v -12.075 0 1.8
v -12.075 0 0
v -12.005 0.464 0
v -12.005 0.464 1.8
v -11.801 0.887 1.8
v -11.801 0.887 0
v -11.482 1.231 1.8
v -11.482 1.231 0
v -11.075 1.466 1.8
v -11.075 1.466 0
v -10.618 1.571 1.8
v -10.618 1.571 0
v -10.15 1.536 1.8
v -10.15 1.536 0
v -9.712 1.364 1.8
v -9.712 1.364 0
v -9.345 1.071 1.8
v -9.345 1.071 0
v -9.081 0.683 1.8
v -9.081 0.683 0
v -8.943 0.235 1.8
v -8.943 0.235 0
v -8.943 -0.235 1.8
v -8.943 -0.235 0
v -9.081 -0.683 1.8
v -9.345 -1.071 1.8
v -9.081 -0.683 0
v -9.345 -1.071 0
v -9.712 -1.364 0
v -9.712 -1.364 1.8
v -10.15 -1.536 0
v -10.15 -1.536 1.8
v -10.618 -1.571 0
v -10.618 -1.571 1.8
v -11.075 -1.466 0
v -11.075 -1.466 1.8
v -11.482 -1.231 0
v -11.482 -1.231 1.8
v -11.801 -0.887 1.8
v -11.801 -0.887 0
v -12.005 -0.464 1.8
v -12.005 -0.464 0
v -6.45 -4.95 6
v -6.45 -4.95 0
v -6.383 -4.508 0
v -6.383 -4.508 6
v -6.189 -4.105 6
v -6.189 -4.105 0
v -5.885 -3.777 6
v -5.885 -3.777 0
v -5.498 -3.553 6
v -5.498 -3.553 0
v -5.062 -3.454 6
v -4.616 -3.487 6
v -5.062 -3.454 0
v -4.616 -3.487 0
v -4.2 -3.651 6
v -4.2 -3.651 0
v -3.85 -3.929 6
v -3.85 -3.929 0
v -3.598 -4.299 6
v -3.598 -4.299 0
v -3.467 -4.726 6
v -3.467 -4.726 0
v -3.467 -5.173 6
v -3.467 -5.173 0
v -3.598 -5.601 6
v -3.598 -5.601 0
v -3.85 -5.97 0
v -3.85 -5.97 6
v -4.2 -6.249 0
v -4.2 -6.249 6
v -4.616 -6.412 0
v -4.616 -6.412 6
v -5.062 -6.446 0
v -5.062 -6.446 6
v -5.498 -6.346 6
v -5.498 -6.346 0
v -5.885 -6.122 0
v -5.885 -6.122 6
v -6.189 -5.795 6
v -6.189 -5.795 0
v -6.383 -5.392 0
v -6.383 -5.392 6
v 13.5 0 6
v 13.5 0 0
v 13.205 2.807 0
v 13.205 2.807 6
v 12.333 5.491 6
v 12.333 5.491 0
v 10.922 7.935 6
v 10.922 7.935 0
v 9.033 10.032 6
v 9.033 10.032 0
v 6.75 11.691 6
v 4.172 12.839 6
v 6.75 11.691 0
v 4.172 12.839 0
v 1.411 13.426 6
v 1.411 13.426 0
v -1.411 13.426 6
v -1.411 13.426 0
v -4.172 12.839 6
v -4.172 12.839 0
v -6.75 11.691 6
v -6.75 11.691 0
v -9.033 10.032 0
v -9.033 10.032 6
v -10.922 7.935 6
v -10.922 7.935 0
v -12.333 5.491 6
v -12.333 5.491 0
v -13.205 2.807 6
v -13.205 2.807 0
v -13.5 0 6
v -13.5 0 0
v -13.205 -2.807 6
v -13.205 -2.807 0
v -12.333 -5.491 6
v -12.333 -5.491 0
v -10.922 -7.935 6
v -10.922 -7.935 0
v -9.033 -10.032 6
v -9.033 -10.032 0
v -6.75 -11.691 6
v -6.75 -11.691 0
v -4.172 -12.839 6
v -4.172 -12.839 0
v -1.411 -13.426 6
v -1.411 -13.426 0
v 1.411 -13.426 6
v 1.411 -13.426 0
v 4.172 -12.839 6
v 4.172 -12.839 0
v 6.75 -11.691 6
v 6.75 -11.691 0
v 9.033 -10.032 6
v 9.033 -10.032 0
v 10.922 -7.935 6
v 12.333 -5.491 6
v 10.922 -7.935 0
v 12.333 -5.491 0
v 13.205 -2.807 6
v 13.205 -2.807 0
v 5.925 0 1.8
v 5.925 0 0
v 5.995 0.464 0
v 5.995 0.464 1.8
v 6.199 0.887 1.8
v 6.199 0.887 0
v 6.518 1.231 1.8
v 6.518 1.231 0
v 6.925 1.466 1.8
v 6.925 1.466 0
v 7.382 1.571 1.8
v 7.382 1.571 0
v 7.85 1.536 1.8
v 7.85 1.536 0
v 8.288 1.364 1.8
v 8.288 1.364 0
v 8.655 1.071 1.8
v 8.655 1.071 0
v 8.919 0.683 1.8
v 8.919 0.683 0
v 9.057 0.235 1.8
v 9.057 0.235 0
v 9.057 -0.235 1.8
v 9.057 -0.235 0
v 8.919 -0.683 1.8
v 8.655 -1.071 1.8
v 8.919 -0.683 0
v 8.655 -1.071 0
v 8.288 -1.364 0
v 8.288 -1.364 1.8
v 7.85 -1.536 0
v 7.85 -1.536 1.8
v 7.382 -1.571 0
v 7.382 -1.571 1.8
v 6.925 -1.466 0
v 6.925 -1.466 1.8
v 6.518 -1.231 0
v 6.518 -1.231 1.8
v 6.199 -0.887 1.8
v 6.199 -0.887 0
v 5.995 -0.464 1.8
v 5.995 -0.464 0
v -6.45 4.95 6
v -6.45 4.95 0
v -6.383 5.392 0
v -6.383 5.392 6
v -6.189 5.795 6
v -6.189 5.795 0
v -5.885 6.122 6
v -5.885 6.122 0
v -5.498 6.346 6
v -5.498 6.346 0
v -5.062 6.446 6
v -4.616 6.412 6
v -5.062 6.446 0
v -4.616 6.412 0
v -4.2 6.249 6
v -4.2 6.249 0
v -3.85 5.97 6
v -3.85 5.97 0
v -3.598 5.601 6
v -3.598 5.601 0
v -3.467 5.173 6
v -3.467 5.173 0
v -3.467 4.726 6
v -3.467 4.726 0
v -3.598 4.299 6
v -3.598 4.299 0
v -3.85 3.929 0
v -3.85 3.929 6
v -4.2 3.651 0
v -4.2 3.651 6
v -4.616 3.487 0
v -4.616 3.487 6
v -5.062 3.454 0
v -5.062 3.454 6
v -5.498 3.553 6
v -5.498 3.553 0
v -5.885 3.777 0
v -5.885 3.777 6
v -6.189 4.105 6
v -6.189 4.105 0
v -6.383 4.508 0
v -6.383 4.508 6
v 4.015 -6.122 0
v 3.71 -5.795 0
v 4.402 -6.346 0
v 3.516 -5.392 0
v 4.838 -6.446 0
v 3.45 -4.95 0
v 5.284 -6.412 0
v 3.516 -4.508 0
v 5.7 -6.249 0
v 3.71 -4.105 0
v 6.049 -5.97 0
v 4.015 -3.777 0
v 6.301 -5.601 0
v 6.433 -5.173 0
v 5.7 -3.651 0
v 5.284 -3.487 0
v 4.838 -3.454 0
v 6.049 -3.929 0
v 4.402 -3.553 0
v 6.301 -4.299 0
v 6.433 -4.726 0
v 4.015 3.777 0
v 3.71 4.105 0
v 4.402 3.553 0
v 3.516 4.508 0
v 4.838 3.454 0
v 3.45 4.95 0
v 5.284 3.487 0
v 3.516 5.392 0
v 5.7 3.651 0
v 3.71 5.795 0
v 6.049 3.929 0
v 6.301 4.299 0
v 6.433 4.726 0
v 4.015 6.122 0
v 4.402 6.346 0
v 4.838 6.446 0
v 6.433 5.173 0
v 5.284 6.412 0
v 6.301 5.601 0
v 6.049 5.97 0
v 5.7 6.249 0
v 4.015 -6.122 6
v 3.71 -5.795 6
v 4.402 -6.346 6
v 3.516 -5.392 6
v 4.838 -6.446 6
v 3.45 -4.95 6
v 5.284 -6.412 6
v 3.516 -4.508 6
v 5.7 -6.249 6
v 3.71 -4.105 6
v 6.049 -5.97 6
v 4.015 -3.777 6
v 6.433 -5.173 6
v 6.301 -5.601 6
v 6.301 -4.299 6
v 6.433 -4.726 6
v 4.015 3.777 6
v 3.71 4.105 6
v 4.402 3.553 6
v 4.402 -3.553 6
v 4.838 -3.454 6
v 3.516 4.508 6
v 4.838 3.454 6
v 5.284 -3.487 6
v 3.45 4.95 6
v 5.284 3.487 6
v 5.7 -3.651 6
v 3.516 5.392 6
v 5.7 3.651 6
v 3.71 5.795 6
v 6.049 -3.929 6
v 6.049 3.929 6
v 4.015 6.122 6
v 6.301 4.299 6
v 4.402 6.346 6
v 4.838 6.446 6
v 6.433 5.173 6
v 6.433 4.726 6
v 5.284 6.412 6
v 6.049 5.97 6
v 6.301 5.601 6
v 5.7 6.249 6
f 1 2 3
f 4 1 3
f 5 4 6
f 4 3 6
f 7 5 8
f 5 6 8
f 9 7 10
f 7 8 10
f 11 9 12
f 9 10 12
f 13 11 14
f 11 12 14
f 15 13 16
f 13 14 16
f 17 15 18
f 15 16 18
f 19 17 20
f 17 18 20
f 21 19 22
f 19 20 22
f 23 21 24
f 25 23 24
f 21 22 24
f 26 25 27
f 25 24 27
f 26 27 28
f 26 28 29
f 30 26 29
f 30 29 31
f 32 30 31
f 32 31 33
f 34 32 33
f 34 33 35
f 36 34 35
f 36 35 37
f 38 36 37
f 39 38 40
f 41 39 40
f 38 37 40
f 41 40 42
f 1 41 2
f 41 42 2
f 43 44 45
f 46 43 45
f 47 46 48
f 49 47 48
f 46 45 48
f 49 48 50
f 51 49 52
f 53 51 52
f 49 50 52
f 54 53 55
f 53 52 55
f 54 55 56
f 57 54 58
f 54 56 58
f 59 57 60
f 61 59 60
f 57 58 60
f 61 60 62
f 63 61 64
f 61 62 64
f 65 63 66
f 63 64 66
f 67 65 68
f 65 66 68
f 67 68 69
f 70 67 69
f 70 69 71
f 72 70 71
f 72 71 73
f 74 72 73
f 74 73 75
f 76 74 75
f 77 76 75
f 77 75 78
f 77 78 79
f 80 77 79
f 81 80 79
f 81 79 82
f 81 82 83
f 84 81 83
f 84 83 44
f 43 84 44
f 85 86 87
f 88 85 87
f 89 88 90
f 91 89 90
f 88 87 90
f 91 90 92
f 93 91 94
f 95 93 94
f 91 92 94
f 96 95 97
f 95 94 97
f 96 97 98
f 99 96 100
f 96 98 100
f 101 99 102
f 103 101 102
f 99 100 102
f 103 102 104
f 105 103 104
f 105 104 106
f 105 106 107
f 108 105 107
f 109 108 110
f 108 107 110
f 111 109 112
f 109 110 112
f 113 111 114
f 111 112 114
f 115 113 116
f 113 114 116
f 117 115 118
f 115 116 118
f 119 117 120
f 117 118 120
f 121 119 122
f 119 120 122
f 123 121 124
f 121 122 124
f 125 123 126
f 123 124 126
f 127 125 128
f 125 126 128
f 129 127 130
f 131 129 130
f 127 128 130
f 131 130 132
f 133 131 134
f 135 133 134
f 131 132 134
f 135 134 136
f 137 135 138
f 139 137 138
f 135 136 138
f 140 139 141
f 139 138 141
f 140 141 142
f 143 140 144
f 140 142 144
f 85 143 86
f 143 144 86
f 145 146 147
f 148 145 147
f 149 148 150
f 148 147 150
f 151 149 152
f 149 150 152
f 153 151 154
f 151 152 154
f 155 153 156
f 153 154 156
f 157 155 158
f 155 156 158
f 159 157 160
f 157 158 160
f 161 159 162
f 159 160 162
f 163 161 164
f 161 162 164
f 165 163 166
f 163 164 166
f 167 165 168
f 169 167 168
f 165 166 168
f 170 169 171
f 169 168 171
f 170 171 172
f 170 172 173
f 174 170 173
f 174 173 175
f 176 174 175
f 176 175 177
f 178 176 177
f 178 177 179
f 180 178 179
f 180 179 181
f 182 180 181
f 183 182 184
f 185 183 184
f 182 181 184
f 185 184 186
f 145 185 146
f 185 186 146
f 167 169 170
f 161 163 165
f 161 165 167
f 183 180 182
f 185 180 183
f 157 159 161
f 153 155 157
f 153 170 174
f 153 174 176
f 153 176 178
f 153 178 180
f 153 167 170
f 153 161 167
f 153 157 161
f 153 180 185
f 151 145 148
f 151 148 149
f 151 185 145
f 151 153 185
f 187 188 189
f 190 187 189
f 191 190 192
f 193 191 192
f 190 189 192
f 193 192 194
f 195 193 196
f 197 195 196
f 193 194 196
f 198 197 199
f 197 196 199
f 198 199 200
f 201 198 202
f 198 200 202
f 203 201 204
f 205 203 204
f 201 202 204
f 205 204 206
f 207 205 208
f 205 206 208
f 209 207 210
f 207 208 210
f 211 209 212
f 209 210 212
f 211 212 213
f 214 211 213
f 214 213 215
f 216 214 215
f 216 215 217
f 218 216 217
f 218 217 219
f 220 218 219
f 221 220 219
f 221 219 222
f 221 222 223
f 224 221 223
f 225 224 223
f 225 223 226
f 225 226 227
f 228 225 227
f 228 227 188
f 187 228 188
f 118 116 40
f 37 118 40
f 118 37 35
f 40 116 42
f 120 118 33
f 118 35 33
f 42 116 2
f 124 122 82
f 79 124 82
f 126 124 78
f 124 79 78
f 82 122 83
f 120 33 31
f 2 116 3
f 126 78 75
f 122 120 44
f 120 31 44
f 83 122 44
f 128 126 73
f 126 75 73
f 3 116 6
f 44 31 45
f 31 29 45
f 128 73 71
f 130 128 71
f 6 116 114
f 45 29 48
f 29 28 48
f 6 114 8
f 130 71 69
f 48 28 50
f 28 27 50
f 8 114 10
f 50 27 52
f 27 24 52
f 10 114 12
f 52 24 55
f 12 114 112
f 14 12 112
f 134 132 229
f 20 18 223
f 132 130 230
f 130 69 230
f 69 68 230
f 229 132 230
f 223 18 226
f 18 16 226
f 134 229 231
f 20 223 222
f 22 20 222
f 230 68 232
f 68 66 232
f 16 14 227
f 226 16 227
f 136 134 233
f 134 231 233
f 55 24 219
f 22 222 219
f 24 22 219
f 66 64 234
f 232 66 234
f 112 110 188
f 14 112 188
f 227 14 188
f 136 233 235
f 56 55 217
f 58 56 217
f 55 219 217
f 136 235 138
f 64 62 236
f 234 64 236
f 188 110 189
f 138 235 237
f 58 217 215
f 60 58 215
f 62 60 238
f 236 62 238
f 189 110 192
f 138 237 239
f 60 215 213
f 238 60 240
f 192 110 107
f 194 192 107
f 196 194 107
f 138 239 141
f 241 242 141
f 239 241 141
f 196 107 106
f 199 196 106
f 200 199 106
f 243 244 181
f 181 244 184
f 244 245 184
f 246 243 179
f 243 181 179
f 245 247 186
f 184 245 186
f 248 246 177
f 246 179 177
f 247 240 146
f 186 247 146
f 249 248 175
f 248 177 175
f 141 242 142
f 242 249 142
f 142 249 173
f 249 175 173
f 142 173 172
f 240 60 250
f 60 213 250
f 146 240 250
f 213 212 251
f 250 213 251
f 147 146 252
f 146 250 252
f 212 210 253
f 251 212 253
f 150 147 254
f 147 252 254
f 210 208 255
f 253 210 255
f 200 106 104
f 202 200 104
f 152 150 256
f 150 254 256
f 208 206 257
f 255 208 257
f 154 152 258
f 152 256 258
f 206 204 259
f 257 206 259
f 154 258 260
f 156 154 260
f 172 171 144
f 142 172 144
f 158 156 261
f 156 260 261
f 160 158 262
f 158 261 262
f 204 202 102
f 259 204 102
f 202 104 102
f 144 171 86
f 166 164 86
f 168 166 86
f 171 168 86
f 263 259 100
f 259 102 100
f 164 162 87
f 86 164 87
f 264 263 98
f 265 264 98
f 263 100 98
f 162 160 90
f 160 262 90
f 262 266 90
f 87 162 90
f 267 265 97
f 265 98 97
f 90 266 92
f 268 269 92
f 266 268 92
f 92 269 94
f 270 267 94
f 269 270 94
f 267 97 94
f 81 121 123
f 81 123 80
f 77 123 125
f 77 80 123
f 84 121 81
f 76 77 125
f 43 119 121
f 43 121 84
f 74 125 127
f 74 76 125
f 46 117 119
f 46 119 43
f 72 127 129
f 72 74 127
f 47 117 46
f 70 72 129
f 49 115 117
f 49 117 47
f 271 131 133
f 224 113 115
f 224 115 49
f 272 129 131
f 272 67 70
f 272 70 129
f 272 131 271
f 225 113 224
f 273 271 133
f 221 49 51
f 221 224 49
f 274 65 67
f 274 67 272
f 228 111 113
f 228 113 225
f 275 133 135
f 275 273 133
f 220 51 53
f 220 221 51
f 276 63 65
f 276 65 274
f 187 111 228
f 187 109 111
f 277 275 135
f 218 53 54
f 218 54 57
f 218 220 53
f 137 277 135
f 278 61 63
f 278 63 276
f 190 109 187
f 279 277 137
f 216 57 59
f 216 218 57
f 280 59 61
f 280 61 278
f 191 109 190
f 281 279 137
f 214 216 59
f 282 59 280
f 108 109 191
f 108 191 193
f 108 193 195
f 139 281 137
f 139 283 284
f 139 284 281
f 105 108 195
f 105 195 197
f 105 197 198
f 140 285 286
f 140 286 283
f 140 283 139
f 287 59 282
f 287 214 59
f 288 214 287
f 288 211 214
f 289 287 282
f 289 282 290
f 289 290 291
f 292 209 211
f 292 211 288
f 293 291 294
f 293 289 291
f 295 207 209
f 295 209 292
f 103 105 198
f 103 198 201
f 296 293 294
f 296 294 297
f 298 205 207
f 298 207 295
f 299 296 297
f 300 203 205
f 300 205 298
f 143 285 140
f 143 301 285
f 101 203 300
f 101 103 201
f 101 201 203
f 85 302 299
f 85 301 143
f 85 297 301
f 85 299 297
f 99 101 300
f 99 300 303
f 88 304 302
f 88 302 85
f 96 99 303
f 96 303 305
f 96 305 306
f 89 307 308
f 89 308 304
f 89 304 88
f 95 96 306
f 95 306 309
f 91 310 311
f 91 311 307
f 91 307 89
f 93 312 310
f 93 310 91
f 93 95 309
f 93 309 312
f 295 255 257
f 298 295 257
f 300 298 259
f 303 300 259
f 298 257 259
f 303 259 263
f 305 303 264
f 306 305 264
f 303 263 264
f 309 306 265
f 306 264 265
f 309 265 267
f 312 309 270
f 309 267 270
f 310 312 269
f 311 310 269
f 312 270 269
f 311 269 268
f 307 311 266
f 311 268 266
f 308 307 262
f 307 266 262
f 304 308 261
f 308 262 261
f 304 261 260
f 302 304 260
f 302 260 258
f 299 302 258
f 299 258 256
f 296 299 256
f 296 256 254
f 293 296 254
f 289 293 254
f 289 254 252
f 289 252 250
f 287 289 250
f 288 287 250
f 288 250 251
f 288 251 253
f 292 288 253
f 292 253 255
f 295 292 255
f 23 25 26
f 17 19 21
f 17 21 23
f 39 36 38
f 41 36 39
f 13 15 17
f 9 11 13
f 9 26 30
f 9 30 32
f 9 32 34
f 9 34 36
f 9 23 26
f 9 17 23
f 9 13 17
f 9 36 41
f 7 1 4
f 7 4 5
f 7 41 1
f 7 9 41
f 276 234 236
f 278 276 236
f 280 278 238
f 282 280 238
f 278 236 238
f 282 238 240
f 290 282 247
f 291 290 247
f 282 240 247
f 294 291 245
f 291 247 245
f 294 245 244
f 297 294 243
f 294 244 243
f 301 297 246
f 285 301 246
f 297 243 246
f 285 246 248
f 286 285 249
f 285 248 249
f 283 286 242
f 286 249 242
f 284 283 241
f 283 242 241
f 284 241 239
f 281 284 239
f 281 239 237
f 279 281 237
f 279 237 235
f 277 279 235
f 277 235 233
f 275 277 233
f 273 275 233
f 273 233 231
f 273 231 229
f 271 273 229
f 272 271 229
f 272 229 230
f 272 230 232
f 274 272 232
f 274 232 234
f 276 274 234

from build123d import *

# Parameters (mm, degrees)
CROQUIS1_R                        = 13.5
SALIENTE_EXTRUIR1_DEPTH           = 6
CROQUIS3_R                        = 1.575
CORTAR_EXTRUIR1_DEPTH             = 1.8
DI_METRO_DE_TALADRO_3_0_3_2_D     = 3
DI_METRO_DE_TALADRO_3_0_3_2_DEPTH = 50
DI_METRO_DE_TALADRO_3_0_3_2_TIP   = 0.901290929


with BuildPart() as part:
    # Croquis1 → Saliente-Extruir1 (new body)
    with BuildSketch(Plane.XY):
        Circle(CROQUIS1_R)
    extrude(amount=SALIENTE_EXTRUIR1_DEPTH)

    # Croquis3 → Cortar-Extruir1 (cut)
    with BuildSketch(Plane(origin=(0, 0, 0), x_dir=(-1, 0, 0), z_dir=(0, 0, -1))):
        with Locations((10.5, 0)):
            Circle(CROQUIS3_R)
        with Locations((-7.5, 0)):
            Circle(CROQUIS3_R)
    extrude(amount=-CORTAR_EXTRUIR1_DEPTH, mode=Mode.SUBTRACT)

    # Diámetro de taladro Ø3.0 (3)2
    with Locations(Plane.XY.offset(6)):
        with Locations((-4.949747468, 4.949747468), (-4.949747468, -4.949747468), (4.949747468, -4.949747468), (4.949747468, 4.949747468)):
            Hole(DI_METRO_DE_TALADRO_3_0_3_2_D / 2, depth=DI_METRO_DE_TALADRO_3_0_3_2_DEPTH)
            with Locations((0, 0, -(DI_METRO_DE_TALADRO_3_0_3_2_DEPTH + DI_METRO_DE_TALADRO_3_0_3_2_TIP / 2))):  # 118° drill point
                Cone(0, DI_METRO_DE_TALADRO_3_0_3_2_D / 2, DI_METRO_DE_TALADRO_3_0_3_2_TIP, mode=Mode.SUBTRACT)


solid = part.part
